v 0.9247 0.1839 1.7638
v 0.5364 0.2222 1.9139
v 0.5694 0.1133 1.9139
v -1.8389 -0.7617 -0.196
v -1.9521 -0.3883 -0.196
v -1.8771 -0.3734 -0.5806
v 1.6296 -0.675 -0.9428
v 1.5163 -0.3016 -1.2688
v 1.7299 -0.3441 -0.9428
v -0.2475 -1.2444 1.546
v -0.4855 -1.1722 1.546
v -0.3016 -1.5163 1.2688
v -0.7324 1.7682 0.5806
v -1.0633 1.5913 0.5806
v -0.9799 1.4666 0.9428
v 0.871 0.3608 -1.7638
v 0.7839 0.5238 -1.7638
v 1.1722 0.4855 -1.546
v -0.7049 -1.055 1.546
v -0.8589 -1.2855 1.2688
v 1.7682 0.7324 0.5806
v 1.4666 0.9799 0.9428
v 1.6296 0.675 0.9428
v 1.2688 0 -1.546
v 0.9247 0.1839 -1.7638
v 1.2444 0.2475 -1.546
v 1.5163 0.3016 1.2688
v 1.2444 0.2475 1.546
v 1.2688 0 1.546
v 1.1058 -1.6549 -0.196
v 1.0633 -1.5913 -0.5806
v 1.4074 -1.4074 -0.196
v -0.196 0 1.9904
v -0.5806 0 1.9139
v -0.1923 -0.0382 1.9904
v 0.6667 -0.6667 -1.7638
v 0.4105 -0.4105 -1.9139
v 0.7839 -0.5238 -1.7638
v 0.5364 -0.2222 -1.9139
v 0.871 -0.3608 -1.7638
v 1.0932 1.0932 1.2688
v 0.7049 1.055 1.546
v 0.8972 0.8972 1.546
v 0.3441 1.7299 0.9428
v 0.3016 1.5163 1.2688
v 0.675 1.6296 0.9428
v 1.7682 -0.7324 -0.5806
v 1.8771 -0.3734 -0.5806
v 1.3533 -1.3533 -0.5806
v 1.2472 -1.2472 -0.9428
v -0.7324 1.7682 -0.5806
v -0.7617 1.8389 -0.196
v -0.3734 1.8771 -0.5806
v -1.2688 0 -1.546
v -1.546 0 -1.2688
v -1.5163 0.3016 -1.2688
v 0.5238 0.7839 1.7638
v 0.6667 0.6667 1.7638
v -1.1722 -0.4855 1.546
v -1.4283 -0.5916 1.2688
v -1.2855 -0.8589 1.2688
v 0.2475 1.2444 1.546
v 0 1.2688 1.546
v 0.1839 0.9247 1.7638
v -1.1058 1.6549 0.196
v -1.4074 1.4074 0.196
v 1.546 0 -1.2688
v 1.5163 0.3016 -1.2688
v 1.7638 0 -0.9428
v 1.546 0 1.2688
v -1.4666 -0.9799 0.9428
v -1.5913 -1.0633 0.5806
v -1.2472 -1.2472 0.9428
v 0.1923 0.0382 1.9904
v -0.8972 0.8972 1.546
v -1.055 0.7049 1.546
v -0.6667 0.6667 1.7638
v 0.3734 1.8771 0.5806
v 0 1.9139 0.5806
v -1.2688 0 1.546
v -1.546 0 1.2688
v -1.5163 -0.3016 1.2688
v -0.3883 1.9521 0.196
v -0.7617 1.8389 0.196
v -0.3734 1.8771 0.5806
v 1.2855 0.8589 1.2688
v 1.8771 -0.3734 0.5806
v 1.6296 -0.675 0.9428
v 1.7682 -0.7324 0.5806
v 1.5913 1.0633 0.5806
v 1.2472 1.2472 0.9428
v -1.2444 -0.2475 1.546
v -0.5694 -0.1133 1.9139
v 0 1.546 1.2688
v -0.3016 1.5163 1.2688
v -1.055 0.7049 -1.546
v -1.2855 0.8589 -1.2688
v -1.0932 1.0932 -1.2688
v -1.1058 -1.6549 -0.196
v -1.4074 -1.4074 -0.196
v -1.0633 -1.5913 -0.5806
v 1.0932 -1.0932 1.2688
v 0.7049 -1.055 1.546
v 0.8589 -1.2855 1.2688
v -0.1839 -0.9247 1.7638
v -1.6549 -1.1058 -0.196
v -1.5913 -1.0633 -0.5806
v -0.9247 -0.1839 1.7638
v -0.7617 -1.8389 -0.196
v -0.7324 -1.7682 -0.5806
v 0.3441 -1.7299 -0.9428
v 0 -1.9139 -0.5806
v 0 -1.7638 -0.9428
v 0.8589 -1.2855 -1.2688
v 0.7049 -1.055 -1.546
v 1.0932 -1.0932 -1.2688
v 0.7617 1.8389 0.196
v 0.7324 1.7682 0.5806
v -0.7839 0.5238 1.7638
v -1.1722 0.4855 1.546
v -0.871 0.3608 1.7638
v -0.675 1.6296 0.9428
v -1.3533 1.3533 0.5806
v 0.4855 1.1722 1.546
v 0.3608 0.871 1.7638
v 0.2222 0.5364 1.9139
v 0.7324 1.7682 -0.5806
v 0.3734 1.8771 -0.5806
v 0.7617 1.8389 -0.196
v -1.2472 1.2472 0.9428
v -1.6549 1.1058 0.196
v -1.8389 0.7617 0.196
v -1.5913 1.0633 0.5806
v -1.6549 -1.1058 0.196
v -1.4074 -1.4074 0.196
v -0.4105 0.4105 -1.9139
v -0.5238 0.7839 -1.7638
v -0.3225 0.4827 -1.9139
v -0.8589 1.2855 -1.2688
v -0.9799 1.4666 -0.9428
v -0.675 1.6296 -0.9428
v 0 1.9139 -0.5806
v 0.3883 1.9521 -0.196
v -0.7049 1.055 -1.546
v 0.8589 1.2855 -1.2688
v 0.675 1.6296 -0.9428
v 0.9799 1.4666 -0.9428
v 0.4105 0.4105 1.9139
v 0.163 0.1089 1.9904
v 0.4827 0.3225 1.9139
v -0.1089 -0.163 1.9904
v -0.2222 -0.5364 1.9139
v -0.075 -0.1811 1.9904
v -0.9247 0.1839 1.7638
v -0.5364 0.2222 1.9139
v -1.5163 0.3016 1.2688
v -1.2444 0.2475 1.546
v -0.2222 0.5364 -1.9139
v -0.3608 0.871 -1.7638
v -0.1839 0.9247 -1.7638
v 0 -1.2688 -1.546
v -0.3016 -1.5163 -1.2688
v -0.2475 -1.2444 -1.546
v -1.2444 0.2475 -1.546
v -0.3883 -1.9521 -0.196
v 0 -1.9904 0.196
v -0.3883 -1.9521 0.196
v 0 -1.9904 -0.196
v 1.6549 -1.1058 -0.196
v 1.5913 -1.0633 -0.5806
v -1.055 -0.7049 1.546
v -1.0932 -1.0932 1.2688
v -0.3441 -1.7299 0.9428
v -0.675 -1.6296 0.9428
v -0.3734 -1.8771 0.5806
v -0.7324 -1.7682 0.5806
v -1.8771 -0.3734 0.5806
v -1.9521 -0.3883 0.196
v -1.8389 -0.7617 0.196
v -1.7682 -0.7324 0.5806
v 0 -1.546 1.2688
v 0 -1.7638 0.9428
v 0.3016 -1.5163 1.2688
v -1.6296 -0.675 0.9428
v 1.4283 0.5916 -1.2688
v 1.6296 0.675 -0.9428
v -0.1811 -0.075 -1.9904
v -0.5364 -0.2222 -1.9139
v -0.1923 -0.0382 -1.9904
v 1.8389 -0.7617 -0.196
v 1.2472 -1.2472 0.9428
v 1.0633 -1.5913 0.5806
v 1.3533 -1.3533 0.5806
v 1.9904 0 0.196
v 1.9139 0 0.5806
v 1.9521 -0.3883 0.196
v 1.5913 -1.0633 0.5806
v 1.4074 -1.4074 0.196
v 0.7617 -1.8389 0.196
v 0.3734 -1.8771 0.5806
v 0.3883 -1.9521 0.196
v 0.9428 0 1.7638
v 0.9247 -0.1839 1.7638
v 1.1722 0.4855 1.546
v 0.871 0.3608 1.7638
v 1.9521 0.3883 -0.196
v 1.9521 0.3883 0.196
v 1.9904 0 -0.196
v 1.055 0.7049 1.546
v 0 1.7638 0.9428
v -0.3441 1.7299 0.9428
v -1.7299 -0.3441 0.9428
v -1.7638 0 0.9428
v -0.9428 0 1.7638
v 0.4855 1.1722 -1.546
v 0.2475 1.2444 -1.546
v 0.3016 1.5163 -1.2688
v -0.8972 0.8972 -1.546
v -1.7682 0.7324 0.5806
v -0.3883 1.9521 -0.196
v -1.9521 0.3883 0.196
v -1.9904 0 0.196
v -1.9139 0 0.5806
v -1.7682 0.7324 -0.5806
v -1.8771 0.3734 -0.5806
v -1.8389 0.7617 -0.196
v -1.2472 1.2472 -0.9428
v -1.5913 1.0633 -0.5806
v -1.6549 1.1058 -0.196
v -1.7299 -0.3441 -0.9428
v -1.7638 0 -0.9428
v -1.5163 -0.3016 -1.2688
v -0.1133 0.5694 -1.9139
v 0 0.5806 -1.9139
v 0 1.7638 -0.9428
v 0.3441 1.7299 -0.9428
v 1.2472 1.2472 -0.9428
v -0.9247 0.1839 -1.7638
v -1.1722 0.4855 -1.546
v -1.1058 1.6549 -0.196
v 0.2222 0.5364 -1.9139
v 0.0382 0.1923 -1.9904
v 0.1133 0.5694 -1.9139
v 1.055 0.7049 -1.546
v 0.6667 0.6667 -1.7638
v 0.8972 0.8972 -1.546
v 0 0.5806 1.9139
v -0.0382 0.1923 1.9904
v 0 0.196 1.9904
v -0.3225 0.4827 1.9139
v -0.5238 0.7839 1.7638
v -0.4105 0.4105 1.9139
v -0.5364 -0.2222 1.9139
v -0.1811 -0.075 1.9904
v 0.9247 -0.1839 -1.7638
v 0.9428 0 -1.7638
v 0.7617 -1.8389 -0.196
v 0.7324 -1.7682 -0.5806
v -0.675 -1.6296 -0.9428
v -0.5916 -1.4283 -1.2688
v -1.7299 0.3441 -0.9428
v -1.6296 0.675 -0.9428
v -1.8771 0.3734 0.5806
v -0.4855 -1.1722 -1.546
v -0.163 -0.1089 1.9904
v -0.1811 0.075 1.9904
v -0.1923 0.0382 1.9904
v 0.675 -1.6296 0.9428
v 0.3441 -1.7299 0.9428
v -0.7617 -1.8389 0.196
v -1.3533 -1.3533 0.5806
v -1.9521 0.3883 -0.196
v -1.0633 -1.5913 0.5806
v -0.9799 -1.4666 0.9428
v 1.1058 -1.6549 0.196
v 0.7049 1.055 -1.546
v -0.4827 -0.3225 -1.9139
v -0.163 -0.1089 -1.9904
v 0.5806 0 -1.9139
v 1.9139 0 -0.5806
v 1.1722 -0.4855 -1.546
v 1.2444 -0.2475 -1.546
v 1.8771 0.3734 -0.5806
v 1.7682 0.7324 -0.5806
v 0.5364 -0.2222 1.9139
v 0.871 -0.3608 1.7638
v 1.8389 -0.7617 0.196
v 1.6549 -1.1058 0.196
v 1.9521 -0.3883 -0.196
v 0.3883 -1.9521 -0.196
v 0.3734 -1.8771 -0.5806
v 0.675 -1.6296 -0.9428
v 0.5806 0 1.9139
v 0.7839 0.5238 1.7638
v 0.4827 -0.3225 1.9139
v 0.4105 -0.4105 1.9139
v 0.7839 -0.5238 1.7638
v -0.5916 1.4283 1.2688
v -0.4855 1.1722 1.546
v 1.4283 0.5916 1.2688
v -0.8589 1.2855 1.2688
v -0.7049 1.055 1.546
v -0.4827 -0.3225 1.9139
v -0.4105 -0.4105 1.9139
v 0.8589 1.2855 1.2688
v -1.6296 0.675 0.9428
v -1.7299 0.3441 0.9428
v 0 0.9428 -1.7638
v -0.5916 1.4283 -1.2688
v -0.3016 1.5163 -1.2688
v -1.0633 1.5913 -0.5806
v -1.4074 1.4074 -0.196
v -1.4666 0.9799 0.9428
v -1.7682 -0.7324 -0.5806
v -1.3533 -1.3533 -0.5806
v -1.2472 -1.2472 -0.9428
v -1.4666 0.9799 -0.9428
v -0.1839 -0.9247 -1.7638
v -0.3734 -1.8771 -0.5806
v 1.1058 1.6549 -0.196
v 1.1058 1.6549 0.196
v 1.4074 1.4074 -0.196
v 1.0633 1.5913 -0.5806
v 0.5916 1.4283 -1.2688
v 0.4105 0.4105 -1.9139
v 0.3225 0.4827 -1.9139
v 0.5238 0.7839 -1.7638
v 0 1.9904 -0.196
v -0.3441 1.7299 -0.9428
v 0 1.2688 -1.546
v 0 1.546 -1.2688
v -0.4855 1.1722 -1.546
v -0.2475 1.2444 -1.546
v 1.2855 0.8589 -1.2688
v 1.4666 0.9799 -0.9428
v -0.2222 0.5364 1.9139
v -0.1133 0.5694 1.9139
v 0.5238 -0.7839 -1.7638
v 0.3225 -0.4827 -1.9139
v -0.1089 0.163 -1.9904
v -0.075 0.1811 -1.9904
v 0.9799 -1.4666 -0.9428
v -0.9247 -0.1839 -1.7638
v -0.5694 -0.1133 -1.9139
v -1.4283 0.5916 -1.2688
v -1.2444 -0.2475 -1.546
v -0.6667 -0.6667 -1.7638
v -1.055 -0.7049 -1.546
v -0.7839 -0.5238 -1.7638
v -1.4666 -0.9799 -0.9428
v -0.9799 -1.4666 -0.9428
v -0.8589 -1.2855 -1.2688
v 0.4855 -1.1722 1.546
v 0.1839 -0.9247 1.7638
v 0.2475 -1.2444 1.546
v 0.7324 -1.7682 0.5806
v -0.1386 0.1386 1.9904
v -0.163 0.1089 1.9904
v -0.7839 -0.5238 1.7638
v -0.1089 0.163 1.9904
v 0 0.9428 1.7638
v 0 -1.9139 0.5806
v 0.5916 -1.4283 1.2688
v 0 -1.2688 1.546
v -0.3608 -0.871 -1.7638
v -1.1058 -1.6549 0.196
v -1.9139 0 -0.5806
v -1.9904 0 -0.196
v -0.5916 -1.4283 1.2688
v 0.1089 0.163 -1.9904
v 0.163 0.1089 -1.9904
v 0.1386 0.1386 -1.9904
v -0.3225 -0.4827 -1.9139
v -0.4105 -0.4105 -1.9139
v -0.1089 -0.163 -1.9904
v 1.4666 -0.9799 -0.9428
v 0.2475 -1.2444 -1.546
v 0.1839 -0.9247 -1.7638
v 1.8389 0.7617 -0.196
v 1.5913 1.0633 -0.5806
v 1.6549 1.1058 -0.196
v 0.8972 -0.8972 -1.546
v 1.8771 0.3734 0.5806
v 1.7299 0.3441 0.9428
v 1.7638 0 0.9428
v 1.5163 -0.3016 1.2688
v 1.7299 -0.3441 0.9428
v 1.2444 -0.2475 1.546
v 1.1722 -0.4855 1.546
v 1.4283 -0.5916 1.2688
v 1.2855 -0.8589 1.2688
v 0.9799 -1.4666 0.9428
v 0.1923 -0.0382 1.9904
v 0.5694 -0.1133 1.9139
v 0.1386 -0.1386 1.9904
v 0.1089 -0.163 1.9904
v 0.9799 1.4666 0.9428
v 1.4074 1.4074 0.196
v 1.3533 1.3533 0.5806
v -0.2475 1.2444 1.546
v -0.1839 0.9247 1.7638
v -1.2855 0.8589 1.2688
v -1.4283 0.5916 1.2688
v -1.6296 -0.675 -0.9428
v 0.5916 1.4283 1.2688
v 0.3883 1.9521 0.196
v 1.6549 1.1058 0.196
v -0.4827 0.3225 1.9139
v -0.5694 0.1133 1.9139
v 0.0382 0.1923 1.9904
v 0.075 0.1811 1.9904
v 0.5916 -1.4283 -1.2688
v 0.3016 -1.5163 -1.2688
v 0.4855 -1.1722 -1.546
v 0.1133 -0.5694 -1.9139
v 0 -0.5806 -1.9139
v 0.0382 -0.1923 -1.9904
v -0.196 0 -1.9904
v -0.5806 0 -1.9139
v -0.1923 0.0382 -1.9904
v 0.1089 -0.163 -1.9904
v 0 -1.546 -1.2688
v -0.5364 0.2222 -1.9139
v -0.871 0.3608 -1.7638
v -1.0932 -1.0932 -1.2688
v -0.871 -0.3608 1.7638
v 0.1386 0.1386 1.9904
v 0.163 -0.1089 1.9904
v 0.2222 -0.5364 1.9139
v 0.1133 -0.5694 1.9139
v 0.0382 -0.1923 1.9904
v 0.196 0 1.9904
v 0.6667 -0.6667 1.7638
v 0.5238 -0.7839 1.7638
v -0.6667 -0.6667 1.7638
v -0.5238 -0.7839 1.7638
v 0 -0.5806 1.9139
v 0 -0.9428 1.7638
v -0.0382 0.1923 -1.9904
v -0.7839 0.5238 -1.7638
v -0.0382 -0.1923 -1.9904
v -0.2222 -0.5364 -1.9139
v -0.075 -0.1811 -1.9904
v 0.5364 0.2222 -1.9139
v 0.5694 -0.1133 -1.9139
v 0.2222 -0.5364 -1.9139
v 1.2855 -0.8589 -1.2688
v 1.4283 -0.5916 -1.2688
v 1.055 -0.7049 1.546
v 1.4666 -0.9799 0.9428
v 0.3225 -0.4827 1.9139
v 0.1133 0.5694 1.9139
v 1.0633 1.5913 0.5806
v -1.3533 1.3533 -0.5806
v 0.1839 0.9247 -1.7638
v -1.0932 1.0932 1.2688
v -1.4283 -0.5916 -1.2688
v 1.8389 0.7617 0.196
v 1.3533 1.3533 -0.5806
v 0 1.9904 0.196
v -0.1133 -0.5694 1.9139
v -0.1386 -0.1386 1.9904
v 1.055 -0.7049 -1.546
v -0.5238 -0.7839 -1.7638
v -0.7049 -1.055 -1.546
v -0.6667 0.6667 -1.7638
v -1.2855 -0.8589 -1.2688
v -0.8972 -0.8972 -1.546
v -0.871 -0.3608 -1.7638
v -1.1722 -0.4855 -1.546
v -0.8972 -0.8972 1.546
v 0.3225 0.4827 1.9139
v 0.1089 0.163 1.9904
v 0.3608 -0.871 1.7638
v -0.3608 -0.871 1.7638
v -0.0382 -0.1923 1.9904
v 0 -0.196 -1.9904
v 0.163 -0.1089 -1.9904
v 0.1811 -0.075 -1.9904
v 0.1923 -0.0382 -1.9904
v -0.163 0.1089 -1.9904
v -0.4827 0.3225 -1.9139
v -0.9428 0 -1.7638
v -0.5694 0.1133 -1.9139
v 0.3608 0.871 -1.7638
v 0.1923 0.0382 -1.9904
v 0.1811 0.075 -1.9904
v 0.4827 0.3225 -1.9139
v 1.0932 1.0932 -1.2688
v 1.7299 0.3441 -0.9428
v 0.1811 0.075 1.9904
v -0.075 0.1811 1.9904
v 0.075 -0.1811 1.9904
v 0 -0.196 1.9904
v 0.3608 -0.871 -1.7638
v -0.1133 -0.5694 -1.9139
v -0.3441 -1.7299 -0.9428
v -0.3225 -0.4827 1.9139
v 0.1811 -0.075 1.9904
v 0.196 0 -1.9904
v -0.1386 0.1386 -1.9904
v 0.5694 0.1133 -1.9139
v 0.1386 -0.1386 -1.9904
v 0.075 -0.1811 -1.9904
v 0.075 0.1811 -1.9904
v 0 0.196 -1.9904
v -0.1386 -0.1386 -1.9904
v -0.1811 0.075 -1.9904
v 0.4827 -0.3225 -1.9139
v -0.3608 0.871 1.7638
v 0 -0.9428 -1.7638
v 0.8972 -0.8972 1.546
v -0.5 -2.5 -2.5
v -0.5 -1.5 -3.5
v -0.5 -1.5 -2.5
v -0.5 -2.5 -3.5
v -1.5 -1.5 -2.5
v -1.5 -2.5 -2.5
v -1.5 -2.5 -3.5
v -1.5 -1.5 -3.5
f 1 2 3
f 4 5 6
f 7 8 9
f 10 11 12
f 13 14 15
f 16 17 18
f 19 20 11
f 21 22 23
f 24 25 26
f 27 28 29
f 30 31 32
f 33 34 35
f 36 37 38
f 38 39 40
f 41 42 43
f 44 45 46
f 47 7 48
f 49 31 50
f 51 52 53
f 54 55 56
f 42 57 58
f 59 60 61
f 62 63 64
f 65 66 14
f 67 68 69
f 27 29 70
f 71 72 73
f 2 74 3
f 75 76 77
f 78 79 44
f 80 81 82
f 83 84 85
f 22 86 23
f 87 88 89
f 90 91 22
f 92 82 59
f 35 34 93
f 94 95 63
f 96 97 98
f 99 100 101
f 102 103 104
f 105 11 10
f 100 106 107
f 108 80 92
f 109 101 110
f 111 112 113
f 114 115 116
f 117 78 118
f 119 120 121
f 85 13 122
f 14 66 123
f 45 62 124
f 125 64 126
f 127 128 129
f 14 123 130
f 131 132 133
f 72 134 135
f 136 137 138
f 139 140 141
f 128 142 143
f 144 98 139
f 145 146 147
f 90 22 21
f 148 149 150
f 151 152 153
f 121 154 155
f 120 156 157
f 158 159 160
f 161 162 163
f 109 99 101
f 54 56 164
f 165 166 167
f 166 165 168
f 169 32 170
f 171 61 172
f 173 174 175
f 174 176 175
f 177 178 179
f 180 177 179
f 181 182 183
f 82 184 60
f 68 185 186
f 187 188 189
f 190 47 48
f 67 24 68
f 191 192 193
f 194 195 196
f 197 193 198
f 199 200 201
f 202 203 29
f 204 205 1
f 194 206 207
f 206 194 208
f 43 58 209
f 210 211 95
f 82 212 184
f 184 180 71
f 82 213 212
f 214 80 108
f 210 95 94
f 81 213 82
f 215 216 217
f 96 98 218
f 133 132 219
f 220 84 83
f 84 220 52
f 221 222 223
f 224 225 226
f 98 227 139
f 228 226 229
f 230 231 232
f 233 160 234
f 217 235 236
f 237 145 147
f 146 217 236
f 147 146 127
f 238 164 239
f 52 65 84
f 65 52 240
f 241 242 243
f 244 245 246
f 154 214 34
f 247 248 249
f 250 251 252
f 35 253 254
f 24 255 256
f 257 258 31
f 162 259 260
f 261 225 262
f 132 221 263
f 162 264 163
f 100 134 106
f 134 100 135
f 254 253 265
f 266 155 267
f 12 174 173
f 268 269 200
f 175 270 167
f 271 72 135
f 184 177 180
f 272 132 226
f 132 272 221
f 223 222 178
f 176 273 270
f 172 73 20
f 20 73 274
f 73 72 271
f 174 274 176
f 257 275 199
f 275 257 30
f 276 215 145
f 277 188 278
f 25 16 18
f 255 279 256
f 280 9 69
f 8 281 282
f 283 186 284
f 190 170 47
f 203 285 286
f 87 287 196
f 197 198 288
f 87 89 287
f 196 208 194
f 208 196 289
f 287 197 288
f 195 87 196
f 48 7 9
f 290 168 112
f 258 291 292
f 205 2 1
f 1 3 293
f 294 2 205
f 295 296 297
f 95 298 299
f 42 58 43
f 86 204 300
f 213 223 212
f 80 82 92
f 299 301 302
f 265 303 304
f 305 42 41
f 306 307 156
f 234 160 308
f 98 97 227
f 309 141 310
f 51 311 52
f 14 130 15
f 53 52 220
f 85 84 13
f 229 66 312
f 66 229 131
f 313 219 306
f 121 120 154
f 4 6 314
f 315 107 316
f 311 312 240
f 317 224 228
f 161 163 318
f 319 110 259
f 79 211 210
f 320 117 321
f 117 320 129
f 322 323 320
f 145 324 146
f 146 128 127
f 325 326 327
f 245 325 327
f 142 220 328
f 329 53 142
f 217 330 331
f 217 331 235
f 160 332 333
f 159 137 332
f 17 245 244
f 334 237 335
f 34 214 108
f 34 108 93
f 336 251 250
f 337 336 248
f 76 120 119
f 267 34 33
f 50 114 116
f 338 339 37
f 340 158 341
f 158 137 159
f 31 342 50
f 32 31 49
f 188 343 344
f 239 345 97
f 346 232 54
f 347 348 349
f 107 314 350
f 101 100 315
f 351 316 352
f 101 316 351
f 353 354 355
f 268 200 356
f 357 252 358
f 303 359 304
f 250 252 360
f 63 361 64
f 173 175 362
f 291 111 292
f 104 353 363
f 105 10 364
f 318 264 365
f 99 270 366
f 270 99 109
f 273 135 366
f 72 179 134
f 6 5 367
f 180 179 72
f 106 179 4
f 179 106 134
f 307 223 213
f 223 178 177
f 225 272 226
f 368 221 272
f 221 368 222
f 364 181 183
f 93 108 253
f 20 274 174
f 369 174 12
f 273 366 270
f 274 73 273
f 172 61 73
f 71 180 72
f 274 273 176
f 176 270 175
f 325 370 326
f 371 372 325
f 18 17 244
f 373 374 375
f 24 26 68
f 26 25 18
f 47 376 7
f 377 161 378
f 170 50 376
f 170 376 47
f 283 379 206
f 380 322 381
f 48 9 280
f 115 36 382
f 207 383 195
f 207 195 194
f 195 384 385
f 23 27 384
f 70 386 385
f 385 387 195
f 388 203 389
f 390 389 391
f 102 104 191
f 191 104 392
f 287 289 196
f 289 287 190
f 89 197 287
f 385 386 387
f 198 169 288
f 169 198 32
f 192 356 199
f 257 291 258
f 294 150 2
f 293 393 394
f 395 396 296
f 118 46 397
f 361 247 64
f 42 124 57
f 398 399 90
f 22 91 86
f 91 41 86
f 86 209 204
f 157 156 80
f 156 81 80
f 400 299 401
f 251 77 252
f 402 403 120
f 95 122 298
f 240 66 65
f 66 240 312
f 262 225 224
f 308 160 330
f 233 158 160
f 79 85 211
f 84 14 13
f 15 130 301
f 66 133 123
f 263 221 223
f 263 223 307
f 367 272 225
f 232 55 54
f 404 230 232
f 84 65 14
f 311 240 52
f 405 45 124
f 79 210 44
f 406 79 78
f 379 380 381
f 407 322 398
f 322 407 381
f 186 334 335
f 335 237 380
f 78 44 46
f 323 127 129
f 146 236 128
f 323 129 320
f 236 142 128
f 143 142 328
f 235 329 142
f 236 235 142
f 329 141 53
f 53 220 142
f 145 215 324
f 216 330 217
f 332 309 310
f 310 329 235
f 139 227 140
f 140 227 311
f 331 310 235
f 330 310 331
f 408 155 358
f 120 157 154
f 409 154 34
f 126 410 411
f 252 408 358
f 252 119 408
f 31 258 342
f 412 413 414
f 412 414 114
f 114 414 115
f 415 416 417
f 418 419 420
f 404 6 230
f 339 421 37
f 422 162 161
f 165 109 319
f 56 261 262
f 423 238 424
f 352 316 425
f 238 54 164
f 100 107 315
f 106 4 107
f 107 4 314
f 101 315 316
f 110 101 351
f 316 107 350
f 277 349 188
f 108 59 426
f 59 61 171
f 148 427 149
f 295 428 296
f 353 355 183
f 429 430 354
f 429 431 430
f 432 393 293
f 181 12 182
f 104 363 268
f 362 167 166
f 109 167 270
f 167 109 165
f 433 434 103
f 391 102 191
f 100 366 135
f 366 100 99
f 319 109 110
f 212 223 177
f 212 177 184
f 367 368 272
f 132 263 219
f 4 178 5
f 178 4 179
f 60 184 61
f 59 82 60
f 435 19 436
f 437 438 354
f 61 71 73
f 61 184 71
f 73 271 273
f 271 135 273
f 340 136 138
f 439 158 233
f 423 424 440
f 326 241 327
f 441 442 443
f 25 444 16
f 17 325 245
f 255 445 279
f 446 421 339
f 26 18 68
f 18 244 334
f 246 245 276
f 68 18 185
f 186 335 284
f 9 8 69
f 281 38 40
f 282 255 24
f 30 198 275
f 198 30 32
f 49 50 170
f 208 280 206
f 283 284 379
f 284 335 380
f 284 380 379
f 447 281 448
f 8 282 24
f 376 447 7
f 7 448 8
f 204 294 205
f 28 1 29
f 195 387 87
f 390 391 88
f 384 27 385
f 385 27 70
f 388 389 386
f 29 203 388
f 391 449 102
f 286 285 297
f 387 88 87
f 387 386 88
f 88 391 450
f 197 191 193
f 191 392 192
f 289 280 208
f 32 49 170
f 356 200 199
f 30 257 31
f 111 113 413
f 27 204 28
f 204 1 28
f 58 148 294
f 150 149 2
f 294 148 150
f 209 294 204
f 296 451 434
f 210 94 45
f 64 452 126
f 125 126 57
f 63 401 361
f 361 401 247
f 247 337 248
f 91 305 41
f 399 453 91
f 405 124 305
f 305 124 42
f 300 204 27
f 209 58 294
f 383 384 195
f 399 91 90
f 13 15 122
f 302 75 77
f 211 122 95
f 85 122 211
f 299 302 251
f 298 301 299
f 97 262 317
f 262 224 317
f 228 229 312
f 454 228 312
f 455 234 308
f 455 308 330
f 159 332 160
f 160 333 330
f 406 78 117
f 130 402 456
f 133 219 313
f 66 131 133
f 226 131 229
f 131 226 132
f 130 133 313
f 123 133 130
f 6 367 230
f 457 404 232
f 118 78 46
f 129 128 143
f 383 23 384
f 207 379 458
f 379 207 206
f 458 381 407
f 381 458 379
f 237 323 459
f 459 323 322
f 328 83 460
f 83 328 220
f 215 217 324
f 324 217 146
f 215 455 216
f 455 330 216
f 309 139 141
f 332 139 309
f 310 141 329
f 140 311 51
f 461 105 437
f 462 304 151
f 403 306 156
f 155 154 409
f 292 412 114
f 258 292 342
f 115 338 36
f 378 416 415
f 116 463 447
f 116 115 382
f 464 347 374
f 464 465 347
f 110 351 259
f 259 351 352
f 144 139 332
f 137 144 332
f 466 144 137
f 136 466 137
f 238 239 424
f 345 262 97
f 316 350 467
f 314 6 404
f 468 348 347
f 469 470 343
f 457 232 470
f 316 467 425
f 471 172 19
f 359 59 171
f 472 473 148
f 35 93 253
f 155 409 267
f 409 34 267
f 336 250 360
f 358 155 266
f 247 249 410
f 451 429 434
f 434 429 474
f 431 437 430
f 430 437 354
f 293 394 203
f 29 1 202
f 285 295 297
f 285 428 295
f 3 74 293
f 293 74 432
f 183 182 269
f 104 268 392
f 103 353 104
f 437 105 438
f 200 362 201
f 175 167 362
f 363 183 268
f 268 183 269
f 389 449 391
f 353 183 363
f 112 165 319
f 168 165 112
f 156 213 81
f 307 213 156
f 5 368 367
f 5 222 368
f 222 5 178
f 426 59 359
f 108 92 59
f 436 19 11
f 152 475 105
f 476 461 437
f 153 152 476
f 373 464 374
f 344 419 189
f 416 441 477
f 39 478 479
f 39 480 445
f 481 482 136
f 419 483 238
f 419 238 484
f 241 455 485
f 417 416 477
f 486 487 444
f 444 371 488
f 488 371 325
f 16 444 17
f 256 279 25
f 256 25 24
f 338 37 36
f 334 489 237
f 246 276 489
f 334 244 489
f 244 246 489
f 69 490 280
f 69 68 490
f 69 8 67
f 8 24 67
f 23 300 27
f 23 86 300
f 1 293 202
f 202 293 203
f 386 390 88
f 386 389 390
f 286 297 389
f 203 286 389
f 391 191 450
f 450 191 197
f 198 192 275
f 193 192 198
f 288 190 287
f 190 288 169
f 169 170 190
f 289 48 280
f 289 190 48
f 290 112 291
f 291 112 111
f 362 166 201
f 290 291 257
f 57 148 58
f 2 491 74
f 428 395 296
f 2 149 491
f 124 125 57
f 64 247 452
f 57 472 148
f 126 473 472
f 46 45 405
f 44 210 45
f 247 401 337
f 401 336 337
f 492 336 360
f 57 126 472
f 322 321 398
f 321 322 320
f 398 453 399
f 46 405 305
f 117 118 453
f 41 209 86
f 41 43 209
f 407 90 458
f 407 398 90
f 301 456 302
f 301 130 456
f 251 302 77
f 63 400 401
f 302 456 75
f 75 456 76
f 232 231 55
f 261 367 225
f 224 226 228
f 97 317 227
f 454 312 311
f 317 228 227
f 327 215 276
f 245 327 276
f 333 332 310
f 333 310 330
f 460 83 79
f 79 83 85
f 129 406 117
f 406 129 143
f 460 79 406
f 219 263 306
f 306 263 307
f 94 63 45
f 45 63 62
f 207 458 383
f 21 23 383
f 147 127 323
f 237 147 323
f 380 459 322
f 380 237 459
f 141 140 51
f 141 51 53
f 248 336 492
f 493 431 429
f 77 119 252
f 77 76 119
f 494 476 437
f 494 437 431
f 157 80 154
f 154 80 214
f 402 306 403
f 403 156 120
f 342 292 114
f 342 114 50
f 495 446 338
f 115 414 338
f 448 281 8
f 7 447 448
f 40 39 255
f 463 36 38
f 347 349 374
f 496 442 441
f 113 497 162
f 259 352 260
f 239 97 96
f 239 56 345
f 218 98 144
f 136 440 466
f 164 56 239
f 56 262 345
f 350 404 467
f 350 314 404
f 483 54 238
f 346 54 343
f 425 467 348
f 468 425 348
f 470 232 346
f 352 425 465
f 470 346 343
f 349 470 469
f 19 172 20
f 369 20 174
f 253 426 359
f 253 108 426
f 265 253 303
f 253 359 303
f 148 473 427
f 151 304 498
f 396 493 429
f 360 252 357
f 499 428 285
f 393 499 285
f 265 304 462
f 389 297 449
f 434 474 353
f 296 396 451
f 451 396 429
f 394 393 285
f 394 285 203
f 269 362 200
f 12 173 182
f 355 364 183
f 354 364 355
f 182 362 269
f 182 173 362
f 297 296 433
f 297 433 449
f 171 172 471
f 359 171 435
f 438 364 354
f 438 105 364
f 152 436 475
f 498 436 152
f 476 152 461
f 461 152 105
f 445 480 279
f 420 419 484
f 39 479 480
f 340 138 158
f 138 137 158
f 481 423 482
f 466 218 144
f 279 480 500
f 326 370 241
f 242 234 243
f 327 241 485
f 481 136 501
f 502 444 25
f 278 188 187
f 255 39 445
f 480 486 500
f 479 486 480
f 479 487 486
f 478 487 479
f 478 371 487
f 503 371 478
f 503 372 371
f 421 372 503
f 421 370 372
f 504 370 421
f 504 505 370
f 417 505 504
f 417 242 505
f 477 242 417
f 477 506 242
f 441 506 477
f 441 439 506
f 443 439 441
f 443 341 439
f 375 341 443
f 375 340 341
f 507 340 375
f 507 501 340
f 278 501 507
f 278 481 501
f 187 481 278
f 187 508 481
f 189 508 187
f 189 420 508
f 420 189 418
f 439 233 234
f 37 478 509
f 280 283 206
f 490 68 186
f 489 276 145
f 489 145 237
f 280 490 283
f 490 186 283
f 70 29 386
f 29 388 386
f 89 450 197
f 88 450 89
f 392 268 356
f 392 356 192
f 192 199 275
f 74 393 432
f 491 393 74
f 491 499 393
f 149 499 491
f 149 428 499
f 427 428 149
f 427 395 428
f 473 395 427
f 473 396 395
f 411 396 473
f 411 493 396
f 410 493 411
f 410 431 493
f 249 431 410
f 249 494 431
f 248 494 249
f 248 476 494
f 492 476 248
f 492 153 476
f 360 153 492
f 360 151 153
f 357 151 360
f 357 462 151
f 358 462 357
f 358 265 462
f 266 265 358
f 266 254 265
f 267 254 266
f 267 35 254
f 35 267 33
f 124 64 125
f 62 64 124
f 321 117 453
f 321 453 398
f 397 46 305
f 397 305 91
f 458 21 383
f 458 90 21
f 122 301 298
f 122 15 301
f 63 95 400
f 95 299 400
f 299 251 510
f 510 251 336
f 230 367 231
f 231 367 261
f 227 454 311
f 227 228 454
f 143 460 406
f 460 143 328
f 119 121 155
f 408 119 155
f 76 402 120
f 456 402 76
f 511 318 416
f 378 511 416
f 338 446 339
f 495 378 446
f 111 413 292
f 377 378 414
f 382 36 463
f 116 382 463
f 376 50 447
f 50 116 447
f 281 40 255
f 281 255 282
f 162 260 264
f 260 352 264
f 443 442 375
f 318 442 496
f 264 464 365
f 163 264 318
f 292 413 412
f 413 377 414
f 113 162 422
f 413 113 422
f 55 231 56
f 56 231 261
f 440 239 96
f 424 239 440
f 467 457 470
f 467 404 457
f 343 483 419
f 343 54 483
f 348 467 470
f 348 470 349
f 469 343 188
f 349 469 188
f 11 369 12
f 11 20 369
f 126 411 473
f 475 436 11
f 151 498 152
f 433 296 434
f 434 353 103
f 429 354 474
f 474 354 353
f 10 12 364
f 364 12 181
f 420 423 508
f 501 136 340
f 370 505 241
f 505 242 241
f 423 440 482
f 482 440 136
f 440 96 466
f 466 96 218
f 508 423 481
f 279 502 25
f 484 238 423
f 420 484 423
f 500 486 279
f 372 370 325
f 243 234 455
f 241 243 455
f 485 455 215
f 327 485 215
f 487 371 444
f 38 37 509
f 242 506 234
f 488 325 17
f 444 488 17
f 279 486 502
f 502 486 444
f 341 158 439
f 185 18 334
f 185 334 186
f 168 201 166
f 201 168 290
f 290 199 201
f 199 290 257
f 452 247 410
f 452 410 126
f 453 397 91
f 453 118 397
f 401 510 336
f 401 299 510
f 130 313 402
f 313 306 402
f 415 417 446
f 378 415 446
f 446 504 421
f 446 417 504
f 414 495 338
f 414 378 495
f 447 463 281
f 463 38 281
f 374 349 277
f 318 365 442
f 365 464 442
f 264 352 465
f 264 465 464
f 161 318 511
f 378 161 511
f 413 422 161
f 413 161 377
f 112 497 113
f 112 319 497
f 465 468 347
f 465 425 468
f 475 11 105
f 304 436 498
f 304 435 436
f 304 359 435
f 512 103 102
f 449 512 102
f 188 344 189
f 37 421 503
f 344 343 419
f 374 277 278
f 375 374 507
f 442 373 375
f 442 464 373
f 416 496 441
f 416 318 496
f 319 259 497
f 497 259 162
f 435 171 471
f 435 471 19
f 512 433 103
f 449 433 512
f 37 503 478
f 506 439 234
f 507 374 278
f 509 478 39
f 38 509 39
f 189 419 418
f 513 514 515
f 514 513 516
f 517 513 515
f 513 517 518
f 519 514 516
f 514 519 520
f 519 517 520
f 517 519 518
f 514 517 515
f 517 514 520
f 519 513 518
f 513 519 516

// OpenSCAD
// file: Scon.scad
function scon_value(data,path,default = function(path) undef,dist = 0) =
  (len(path) <= dist || is_undef(data)) ?
    (is_undef(data) ? default(path) : data) :
    let (
      key = path[dist],
      next = is_undef(key) ?
        data :
	is_string(key) ?
          _scon_map(data, key, path) :
          _scon_index(data, key, path)
    ) scon_value(next, path, default, dist + 1);

function _scon_map(map, key, path) =
    let (result = search([key], map,0)[0])
      len(result) > 0 ? map[result[len(result)-1]][1] : undef;

function _scon_index(list, index, path) =
    (is_list(list) && 0 <= index && index < len(list)) ? list[index] : undef;

function _scon_is_mapping(data) =
    is_list(data) && len(data) == 2 && is_string(data[0]);


function _scon_all_seq(seq,begin,end) =
  begin >= end ? true : seq(begin) && _scon_all_seq(seq,begin+1,end);

function _scon_is_map(data) =
    is_list(data) &&
    _scon_all_seq(function(i) _scon_is_mapping(data[i]),0,len(data));

scon_make = function(scon,base=undef)
  is_undef(base) ?
    function(path,missing=undef)
      scon_value(scon,path,function (missing_path) missing)
  :
    function(path,missing=undef)
      scon_value(scon,path,function (missing_path) base(missing_path,missing));


function _scon_str_seq(seq,begin,end) = // str(seq(begin),...,seq(end-1))
  let (n = (begin < end) ? end - begin : 0,
       m = ((n % 2) == 0) ? n/2 : (n-1) / 2)
  n > 1 ? str(_scon_str_seq(seq,begin,begin+m),_scon_str_seq(seq,begin+m,end)) :
  n == 1 ? str(seq(begin)) : "";

function _scon_str_list(list,begin=0,_end=undef) =
  let (seq = function (i) list[i],end = is_undef(_end) ? len(list) : _end)
  str_seq(seq,begin,end);

// sep can also be a lamba function of the index
function _scon_str_join_seq(seq,begin,end,sep=",") =
  let (n = (begin < end) ? end - begin : 0,
       m = ((n % 2) == 0) ? n/2 : (n-1) / 2)
  n > 1 ? str(_scon_str_join_seq(seq,begin,begin+m,sep),is_function(sep) ? sep(begin+m-1) : sep,_scon_str_join_seq(seq,begin+m,end,sep)) :
  n == 1 ? str(seq(begin)) : "";

function _scon_str_join_list(list,begin=0,_end=undef,sep=",") =
  let (seq = function (i) list[i],end = is_undef(_end) ? len(list) : _end)
  _scon_str_join_seq(seq,begin,end,sep);

function _scon_idigit(number,radix,position) =
  floor(number / pow(radix,position)) % radix;

function _scon_sdigit(number,radix,position) =
  let (digit = _scon_idigit(number,radix,position))
  (digit < 10 ? chr(ord("0")+digit) : chr(ord("a")-10+digit));

function _scon_hex(number,digits) = 
  _scon_str_seq(function(i) _scon_sdigit(number,16,digits-1-i),0,digits);
  
function _scon_json_chr(c) =
  (c == "\"") ? "\\\"" :
  (c == "\'") ? "\\\'" :
  (c == "\n") ? "\\n" :
  (c == "\r") ? "\\r" :
  (c == "\t") ? "\\t" :
  (ord(c) >= 32 && ord(c) <= 127) ? c :
  (ord(c) < 128) ? str("\\x",_scon_hex(ord(c),2)) :
  (ord(c) < 65536) ? str("\\u",_scon_hex(ord(c),4)) :
  str("\\U",_scon_hex(ord(c),6));
  
function _scon_json_str(scon) =
  let (seq=function (i) _scon_json_chr(scon[i]))
  str("\"",_scon_str_seq(seq,0,len(scon)),"\"");

function _scon_json_map(scon) =
  let(seq=function(i) str(_scon_json_str(scon[i][0]),":",scon_json(scon[i][1])))
  str("{",_scon_str_join_seq(seq,0,len(scon)),"}");

function _scon_json_list(scon) =
  let(seq=function(i) scon_json(scon[i]))
  str("[",_scon_str_join_seq(seq,0,len(scon)),"]");

function scon_json(scon) =
  is_undef(scon) ? "null" :
  is_bool(scon) ? str(scon) :
  is_num(scon) ? str(scon) :
  is_string(scon) ? _scon_json_str(scon) :
  _scon_is_map(scon) ? _scon_json_map(scon) :
  is_list(scon) ? _scon_json_list(scon) :
  _scon_json_str("??? ",scon," ???");
  
// main file
include <Scon.scad>

// base configuration values for shapes
shape = scon_make([
  ["center",[0,0,0]],
  ["color",[1,1,0]],
  ["fn", 32]
]);

sphere1 = scon_make([
  ["radius",1]
], shape);

sphere2 = scon_make([
  ["radius",2],
  ["color",[1,0,0,0.25]],
], shape);

cube1 = scon_make([
  ["size",[1,1,1]],
  ["center",[-1,-2,-3]],
  ["color",[0,0,1]]
], shape);

// common steps for shapes
module shape_draw(me) {
  let (me_center=me(["center"]), me_color=me(["color"])) {
    color(me_color) translate(me_center) children();
  }
}

module sphere_draw(me) {
  let(me_radius = me(["radius"]), me_fn = me(["fn"]))
  {
    shape_draw(me) { sphere(r=me_radius,$fn=me_fn); }
  }
}

module cube_draw(me) {
  let(me_size = me(["size"]), me_fn = me(["fn"])) {
    shape_draw(me) { cube(size=me_size, center = true); }
  }
}

sphere_draw(sphere1);
sphere_draw(sphere2);
cube_draw(cube1);
